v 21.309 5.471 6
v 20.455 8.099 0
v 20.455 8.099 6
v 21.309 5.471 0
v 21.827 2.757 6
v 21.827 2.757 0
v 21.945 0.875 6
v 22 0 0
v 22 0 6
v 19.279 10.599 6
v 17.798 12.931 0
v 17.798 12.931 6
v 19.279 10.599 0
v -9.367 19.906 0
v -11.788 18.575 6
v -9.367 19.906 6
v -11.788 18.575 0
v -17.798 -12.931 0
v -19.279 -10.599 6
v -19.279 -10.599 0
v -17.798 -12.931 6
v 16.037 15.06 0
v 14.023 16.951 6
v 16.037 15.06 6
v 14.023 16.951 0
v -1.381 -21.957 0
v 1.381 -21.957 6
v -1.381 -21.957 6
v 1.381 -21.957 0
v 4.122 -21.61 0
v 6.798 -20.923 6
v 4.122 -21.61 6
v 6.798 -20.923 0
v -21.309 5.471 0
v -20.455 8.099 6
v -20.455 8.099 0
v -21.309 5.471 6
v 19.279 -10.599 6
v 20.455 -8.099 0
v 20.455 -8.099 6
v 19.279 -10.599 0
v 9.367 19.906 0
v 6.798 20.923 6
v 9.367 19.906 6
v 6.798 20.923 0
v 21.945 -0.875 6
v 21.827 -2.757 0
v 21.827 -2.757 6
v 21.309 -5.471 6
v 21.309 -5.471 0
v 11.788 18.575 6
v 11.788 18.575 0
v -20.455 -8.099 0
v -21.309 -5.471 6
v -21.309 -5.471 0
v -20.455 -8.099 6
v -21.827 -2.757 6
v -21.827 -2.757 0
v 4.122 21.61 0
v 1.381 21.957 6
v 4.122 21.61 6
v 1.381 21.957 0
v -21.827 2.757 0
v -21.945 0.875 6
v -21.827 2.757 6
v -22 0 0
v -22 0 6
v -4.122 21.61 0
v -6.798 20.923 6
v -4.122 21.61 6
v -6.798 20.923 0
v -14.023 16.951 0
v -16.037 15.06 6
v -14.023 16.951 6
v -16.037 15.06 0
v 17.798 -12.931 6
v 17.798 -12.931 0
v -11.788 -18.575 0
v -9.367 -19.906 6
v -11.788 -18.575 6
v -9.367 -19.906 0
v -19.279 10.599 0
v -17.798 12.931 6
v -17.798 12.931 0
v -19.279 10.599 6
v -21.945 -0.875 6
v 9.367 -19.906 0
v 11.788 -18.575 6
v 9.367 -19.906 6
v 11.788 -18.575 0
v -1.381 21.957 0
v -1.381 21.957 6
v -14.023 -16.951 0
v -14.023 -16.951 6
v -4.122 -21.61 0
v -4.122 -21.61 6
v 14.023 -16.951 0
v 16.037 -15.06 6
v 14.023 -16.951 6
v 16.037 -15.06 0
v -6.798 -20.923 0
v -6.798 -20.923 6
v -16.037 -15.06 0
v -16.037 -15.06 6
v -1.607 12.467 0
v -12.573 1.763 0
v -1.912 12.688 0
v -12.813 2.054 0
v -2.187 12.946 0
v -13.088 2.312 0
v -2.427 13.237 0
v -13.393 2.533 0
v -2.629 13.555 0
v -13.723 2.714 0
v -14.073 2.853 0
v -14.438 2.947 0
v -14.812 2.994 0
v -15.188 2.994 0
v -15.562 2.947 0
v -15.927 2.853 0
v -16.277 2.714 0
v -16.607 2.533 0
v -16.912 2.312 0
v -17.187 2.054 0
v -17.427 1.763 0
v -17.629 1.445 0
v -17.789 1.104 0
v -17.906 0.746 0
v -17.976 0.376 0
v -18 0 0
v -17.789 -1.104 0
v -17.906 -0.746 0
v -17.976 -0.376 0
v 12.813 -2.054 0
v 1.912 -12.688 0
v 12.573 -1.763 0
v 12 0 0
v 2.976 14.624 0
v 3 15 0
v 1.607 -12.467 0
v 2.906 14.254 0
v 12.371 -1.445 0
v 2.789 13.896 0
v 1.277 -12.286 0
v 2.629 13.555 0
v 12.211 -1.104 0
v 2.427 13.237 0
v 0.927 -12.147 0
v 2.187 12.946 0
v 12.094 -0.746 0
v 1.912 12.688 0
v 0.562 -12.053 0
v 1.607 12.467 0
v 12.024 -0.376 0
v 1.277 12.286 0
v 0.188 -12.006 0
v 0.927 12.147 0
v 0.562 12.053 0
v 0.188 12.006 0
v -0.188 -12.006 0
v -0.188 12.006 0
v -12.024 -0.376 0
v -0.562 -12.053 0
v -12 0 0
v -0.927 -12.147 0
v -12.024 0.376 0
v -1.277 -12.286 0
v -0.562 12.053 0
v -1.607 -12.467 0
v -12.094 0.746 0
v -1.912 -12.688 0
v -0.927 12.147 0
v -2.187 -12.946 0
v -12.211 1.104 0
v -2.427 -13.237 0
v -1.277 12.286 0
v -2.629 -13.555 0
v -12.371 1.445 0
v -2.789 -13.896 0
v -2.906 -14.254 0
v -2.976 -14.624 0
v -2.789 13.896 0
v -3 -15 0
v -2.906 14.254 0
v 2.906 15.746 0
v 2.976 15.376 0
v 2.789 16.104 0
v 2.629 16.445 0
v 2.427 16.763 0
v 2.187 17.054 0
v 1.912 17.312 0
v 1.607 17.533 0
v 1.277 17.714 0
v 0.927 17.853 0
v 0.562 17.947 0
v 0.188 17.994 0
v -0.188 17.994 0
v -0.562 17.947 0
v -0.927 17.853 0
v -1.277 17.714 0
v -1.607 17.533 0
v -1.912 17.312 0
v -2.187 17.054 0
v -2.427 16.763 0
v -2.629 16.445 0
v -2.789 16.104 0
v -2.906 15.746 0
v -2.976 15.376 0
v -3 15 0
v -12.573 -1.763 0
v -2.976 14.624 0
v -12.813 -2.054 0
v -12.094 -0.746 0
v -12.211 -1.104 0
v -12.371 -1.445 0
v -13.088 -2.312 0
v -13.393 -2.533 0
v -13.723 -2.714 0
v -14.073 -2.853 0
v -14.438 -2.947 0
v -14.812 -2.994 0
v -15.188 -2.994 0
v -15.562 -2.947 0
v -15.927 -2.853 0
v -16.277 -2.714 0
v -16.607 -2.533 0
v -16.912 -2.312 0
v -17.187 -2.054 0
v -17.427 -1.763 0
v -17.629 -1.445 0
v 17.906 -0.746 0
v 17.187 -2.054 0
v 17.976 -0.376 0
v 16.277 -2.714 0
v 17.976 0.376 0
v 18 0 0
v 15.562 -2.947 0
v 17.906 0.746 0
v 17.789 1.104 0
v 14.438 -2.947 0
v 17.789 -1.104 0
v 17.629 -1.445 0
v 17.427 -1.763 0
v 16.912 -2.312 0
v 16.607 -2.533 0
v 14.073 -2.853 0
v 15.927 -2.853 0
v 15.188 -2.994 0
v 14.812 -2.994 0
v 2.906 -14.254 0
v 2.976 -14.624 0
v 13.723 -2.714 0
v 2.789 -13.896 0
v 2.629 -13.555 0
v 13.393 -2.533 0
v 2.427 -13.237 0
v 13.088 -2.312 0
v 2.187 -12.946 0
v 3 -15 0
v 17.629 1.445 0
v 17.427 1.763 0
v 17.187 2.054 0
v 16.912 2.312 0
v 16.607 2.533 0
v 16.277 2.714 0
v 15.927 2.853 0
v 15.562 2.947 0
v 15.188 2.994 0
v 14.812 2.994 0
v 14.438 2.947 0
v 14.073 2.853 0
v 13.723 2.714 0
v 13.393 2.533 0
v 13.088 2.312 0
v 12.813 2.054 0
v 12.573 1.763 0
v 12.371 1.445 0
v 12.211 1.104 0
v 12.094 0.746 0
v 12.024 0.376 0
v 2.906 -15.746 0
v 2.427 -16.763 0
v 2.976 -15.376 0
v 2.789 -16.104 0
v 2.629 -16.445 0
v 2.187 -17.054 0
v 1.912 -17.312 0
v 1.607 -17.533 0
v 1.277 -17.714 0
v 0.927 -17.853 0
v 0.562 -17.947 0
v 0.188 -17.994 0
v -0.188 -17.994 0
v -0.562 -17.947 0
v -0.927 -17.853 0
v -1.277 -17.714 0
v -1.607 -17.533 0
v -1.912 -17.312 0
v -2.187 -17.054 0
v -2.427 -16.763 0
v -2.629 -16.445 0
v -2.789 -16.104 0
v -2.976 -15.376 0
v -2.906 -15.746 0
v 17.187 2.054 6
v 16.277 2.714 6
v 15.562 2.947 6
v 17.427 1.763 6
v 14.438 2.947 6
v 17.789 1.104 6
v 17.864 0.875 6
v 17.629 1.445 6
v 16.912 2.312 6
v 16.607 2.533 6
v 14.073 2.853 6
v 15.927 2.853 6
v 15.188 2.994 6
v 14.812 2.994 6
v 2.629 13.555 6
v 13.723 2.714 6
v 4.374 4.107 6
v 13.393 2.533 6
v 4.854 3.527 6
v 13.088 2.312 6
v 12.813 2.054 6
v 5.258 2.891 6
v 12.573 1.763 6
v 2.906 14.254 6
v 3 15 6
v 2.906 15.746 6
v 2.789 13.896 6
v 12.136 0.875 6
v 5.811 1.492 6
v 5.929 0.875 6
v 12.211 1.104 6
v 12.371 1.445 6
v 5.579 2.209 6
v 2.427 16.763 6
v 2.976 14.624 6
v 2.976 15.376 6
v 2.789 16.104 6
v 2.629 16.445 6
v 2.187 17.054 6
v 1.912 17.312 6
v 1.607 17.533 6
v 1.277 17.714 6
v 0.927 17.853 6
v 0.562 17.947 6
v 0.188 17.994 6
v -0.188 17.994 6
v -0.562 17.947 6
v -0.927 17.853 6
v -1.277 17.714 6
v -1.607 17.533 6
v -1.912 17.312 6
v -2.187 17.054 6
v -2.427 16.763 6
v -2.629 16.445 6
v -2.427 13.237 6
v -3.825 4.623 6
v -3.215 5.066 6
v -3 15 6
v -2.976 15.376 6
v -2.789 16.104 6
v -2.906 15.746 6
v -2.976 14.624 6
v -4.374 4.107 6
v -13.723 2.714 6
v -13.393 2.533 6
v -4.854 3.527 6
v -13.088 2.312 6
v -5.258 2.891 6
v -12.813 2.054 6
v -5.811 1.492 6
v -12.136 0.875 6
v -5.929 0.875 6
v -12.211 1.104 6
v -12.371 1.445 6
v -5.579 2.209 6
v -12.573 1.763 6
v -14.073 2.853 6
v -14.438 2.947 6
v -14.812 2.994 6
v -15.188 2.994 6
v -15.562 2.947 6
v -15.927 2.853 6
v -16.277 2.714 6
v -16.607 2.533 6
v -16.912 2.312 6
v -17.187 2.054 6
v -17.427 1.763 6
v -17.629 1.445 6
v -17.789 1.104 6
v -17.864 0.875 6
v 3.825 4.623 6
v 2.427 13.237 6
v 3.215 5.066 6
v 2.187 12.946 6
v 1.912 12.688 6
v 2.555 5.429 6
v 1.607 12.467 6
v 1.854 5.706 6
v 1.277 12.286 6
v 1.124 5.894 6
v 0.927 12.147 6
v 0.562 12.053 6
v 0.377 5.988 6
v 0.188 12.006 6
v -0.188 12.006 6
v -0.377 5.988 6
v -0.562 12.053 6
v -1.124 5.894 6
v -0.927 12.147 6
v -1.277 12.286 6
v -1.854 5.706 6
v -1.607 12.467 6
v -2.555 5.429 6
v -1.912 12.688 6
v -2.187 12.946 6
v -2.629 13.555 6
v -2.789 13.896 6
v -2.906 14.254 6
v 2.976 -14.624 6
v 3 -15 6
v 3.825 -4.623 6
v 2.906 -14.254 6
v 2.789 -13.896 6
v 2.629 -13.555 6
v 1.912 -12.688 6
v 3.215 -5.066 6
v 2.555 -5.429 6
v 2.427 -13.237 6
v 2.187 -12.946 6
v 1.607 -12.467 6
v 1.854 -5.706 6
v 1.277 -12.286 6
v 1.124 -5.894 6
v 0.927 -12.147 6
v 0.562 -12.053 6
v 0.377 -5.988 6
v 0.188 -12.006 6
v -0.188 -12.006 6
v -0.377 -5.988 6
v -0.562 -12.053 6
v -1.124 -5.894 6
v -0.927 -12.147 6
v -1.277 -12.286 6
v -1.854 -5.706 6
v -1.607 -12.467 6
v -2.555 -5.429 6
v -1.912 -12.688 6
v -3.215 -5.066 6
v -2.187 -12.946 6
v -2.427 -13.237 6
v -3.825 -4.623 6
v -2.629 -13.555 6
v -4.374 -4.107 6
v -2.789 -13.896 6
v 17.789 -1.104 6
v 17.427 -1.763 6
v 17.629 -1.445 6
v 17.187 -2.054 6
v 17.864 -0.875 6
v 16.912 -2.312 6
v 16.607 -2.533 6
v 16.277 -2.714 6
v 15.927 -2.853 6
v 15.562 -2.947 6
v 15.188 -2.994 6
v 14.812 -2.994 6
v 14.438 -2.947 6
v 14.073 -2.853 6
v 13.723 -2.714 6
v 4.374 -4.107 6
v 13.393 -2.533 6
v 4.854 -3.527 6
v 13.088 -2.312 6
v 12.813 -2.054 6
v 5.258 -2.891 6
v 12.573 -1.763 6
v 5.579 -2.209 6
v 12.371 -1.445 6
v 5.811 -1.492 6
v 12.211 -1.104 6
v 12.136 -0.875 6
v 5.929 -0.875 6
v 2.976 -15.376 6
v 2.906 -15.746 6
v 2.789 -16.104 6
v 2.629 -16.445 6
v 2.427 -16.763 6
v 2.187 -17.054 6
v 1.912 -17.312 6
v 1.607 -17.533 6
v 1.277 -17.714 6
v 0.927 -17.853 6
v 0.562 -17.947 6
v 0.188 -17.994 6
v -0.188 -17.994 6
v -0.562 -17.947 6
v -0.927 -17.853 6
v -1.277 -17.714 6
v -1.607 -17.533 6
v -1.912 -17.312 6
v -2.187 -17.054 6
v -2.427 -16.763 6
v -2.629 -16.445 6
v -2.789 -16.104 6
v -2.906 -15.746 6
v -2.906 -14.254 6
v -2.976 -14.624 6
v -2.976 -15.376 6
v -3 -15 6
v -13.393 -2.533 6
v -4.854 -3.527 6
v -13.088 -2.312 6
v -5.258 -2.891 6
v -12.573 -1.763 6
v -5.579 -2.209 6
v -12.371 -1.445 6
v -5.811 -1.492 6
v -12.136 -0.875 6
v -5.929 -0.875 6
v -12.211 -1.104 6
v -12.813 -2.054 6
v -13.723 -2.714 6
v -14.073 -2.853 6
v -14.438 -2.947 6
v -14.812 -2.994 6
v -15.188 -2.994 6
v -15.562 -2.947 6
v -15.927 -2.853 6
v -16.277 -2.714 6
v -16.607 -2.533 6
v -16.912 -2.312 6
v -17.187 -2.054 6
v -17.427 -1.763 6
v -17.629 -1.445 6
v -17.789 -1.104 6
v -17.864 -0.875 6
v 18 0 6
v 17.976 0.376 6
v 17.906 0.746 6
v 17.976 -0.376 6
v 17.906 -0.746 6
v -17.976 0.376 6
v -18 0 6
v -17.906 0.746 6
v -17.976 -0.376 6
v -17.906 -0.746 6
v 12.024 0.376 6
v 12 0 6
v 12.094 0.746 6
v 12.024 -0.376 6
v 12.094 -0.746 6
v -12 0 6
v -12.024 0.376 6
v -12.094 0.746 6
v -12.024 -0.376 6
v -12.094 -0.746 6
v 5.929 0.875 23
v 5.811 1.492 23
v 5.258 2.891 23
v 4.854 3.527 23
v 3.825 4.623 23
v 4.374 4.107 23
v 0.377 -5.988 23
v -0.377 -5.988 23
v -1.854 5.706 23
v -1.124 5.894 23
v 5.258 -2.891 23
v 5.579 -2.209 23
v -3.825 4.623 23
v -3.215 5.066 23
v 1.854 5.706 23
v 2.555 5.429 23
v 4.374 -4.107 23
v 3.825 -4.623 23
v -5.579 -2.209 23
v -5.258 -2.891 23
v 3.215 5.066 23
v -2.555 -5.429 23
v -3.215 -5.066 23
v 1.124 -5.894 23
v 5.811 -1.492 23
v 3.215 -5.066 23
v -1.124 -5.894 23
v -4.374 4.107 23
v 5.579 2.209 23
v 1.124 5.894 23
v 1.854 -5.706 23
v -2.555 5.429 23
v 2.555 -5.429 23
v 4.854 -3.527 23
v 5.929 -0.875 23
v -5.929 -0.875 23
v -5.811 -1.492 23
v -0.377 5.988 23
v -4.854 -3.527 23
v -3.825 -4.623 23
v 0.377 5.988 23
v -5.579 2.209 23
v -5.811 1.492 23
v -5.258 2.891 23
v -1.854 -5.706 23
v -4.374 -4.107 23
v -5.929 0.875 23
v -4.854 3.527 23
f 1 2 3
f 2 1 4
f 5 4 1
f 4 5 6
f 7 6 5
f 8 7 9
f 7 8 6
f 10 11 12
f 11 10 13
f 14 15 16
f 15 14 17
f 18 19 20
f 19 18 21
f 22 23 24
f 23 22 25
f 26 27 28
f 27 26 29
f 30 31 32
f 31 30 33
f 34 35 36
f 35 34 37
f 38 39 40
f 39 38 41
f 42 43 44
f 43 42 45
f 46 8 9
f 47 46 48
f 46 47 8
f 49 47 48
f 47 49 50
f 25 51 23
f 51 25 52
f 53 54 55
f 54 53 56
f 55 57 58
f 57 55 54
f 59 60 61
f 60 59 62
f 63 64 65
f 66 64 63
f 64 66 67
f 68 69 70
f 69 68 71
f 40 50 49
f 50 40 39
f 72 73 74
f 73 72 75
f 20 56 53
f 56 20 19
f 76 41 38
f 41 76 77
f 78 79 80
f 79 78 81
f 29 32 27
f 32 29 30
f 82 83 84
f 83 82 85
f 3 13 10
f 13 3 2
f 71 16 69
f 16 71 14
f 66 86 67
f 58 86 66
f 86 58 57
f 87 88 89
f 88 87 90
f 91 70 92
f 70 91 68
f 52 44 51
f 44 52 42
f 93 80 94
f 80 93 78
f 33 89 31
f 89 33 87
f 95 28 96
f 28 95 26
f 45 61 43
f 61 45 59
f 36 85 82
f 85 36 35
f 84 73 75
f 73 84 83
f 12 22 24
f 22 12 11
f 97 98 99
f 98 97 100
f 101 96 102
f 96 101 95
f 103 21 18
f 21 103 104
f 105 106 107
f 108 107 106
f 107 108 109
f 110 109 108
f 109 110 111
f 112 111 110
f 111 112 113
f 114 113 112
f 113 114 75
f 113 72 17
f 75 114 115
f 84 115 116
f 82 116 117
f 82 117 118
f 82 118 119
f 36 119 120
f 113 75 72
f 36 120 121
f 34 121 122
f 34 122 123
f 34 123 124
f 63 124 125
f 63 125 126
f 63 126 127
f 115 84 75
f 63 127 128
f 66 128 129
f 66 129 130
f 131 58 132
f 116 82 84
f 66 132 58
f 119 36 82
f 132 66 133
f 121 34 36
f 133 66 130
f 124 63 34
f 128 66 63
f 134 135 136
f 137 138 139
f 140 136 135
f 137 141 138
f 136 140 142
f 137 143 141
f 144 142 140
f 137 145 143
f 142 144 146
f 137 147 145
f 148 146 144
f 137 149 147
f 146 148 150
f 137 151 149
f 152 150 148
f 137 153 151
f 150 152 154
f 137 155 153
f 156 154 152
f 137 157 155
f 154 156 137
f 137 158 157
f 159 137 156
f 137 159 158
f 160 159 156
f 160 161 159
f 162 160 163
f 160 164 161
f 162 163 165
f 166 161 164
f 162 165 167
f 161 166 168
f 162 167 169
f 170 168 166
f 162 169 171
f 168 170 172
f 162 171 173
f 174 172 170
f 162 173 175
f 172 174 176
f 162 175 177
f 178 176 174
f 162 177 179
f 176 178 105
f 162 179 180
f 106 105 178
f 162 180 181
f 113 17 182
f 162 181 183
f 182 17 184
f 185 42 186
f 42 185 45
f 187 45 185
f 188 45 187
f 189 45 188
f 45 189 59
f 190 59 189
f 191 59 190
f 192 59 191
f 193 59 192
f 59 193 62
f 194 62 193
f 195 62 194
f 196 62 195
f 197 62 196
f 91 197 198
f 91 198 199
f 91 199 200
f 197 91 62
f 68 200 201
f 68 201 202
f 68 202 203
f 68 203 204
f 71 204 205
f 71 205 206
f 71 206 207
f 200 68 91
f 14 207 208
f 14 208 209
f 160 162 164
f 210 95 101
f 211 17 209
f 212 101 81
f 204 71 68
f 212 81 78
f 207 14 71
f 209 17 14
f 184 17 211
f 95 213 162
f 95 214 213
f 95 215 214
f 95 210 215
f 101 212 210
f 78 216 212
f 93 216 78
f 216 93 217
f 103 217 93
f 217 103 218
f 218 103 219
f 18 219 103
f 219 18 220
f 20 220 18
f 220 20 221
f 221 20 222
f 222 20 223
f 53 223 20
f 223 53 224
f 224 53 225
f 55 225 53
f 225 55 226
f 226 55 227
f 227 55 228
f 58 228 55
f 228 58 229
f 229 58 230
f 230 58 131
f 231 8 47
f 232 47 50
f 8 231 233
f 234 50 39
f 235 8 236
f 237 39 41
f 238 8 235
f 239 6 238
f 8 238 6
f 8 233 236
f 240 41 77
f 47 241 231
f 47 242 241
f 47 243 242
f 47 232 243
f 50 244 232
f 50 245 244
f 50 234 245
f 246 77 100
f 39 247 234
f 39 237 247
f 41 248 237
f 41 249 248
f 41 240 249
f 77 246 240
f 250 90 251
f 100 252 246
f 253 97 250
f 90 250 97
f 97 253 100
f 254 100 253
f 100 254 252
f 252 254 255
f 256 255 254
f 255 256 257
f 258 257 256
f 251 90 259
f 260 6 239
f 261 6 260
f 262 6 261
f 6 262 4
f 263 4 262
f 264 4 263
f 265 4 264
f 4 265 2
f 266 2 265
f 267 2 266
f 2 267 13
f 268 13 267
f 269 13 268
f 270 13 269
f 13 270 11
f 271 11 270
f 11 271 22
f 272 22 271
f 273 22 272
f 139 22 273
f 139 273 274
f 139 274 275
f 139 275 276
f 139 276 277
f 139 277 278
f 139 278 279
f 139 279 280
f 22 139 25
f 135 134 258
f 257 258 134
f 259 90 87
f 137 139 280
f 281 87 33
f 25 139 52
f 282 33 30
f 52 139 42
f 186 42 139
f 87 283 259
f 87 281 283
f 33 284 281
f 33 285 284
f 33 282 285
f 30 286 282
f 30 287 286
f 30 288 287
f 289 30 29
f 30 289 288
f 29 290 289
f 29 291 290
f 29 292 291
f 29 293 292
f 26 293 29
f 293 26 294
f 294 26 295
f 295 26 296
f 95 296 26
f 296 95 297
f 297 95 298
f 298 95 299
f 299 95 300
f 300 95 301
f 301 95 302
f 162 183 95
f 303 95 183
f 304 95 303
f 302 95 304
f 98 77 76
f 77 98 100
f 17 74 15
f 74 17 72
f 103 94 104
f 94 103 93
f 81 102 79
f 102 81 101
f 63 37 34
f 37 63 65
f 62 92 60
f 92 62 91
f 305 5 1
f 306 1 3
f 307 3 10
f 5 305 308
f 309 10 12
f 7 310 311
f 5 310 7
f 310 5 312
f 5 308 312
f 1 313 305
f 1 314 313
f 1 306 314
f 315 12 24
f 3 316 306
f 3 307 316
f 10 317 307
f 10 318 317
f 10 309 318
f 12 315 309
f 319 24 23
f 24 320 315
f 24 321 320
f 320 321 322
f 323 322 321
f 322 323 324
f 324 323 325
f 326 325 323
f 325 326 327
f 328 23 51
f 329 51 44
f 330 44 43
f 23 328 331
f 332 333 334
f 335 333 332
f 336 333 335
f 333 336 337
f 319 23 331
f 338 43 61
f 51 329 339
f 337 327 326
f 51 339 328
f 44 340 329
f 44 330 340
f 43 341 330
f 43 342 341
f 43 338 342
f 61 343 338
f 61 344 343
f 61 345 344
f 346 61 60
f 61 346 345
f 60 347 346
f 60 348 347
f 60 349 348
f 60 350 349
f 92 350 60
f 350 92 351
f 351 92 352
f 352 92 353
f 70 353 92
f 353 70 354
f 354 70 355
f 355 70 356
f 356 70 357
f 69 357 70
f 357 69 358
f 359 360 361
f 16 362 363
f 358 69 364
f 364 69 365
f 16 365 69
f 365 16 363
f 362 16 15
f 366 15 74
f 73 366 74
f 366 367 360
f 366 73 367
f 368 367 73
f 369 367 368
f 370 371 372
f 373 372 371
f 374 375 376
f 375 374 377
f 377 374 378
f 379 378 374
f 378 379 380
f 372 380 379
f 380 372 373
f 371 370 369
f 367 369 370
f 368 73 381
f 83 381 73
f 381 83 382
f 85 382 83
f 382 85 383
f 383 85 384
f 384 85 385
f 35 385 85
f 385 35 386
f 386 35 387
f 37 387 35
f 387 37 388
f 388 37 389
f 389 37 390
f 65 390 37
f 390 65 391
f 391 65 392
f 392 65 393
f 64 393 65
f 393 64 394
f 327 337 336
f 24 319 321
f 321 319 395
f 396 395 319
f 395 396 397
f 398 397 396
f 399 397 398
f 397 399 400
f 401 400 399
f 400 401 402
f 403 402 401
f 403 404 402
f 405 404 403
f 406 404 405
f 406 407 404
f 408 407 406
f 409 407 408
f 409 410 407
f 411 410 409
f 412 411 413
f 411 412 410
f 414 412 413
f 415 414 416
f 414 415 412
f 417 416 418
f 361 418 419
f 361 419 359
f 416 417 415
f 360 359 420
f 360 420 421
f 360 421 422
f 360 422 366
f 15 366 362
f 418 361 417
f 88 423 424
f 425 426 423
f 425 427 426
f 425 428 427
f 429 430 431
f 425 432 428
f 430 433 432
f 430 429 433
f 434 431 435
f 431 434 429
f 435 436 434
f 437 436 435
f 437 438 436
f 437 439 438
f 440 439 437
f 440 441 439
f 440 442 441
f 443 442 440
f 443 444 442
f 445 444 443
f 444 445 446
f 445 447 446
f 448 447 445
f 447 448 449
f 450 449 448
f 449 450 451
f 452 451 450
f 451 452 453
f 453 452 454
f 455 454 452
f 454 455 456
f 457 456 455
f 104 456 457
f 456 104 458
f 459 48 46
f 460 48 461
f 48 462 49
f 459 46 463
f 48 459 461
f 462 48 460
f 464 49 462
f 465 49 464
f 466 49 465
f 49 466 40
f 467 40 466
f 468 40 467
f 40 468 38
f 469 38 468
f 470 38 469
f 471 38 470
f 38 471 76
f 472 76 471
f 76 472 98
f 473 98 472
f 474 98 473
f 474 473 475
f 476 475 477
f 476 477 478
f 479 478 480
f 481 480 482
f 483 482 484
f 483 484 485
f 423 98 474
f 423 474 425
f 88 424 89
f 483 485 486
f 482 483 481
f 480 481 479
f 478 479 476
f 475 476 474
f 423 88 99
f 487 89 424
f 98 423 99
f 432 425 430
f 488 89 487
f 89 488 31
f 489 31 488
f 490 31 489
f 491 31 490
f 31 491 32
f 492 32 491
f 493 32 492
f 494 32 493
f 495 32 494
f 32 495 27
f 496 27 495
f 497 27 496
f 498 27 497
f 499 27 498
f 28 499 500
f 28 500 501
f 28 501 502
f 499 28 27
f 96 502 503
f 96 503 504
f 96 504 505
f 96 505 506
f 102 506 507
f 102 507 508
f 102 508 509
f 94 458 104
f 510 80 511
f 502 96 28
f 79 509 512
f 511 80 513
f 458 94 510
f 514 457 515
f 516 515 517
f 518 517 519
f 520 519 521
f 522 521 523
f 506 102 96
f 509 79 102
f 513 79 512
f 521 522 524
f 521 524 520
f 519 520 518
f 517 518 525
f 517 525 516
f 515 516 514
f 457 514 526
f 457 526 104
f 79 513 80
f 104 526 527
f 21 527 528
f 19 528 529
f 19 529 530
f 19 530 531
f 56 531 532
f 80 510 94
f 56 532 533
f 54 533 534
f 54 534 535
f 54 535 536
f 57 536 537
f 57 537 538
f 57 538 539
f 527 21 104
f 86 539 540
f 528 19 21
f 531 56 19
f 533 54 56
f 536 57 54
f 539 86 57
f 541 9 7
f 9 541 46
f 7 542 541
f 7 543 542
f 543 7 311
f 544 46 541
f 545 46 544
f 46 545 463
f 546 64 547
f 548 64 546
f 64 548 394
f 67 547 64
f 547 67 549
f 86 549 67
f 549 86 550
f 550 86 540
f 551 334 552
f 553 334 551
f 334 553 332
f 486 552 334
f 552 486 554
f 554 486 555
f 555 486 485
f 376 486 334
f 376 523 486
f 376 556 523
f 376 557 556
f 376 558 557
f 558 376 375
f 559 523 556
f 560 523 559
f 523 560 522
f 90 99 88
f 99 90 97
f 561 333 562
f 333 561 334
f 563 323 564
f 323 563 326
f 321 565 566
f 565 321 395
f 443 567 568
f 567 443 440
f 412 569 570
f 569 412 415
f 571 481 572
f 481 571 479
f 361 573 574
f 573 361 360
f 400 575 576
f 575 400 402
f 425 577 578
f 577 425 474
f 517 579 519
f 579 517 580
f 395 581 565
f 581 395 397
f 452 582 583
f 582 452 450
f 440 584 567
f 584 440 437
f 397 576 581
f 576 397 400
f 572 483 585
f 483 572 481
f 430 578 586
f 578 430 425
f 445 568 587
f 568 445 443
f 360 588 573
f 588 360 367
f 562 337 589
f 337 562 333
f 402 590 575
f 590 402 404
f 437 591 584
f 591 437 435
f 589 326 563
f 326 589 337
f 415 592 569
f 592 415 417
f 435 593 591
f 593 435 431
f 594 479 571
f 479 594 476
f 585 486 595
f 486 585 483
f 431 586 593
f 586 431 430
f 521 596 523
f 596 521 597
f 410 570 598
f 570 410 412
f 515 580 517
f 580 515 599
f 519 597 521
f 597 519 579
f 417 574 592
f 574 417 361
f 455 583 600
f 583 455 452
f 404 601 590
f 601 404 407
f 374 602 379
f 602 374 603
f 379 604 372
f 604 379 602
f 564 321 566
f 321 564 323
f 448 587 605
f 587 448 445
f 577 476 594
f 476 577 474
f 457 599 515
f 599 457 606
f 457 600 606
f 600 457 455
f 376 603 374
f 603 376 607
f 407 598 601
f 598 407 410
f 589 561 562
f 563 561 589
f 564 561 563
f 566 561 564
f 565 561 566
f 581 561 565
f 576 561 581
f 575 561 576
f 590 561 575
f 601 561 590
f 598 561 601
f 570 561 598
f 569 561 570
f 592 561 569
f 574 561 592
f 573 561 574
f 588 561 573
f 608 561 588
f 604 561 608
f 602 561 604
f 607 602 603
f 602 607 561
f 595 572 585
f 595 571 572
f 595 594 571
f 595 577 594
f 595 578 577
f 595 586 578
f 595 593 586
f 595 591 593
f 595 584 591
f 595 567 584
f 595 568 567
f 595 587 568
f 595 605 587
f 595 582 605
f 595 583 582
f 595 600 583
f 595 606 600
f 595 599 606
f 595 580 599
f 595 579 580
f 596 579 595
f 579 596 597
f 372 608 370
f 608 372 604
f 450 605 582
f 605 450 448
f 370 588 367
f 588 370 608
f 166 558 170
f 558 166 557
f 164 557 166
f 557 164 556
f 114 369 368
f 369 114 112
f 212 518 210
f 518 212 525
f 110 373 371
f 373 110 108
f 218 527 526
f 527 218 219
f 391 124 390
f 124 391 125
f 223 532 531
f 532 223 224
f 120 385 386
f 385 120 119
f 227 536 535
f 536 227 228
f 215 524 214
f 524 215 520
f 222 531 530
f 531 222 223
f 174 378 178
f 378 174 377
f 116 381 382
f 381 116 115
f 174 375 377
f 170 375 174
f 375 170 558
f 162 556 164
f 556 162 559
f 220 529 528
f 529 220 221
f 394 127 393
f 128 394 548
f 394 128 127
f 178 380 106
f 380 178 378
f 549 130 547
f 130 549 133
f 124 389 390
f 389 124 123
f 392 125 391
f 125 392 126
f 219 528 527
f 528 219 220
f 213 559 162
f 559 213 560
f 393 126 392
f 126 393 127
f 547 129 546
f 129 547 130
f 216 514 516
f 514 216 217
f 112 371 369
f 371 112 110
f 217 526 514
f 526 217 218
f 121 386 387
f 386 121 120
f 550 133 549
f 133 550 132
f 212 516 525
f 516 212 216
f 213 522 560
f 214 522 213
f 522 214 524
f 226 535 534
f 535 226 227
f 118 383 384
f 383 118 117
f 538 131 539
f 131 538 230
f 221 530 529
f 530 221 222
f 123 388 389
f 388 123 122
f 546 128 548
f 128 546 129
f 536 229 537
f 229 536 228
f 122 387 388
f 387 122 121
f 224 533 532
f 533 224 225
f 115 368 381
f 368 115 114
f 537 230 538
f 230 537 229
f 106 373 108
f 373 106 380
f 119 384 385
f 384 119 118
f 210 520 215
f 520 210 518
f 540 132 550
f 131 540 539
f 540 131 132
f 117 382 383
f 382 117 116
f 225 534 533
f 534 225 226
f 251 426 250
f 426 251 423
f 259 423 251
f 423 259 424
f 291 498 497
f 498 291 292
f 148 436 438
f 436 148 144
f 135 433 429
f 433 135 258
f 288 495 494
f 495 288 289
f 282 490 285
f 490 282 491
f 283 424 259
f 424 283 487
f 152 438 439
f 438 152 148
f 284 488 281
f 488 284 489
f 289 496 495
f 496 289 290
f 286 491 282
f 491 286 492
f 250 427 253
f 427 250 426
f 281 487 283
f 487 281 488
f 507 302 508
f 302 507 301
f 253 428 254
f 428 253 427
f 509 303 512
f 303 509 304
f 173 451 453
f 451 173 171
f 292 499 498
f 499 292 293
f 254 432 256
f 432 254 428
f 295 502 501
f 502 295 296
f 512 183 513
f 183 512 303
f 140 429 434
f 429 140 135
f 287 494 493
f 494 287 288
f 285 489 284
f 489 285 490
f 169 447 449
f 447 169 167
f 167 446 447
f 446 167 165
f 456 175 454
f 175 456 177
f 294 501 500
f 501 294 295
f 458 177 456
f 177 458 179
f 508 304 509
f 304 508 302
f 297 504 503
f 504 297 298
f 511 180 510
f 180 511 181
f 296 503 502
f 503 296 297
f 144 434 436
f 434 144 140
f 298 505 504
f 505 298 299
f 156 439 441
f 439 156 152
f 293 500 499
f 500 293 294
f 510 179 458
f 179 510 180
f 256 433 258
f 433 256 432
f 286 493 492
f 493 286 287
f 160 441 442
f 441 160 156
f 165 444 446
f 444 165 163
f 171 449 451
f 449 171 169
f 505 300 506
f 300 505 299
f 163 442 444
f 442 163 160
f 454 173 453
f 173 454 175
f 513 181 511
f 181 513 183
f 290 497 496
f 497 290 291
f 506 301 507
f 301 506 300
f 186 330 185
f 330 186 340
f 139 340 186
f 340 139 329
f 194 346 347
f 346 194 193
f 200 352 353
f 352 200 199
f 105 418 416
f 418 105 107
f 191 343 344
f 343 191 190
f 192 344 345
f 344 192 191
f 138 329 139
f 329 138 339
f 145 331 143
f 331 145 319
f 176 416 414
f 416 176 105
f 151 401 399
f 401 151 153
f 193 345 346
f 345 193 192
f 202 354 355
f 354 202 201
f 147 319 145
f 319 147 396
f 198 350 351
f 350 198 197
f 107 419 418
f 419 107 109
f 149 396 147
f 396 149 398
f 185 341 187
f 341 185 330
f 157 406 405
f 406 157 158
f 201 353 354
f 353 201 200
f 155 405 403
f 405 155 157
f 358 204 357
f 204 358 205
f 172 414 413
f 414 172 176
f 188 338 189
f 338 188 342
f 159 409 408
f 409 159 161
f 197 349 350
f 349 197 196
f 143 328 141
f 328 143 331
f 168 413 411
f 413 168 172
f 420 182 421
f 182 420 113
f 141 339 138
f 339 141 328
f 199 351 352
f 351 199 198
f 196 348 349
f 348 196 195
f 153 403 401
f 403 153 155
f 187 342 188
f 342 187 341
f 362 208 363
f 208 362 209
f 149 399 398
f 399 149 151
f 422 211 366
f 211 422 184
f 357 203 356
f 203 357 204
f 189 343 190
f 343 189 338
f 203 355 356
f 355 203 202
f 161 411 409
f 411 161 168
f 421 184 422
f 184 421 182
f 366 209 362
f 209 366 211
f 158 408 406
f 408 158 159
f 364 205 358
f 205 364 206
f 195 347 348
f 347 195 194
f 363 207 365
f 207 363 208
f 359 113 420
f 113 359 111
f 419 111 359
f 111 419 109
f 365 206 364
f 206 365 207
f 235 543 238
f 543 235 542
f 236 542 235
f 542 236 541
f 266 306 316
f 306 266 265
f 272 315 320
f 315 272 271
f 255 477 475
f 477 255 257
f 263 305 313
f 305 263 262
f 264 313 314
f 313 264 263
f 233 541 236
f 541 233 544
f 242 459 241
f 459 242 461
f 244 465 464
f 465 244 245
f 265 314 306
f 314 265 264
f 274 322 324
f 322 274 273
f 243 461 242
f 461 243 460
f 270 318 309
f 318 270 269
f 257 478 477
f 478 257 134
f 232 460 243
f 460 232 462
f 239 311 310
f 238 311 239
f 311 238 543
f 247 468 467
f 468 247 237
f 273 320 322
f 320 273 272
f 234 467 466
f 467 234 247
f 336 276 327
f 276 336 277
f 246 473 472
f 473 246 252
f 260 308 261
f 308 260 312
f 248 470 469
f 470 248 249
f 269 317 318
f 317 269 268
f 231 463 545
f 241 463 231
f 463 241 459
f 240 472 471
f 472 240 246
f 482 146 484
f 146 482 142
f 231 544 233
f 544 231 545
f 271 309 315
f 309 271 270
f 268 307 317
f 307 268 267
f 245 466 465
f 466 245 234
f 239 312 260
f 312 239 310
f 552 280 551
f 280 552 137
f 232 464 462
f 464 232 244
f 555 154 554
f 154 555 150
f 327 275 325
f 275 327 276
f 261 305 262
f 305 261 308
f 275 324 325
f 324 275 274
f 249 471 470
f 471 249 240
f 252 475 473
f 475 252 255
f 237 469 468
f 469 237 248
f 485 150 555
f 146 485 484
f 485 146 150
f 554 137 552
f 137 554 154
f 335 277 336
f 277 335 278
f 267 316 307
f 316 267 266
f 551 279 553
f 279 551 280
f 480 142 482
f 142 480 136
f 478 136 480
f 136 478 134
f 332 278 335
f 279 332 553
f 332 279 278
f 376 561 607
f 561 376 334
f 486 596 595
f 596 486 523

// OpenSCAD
$fn = 50;


difference() {
	union() {
		cylinder(h = 6, r = 22.0000000000);
		translate(v = [0, 0, 3.0000000000]) {
			cylinder(h = 20, r = 6.0000000000);
		}
	}
	union() {
		translate(v = [-15.0000000000, 0.0000000000, 0.0000000000]) {
			cylinder(h = 100, r = 3.0000000000);
		}
		translate(v = [0.0000000000, -15.0000000000, 0.0000000000]) {
			cylinder(h = 100, r = 3.0000000000);
		}
		translate(v = [0.0000000000, 15.0000000000, 0.0000000000]) {
			cylinder(h = 100, r = 3.0000000000);
		}
		translate(v = [15.0000000000, 0.0000000000, 0.0000000000]) {
			cylinder(h = 100, r = 3.0000000000);
		}
		translate(v = [-27.0000000000, -0.8750000000, 6]) {
			cube(size = [54, 1.7500000000, 20]);
		}
	}
}
